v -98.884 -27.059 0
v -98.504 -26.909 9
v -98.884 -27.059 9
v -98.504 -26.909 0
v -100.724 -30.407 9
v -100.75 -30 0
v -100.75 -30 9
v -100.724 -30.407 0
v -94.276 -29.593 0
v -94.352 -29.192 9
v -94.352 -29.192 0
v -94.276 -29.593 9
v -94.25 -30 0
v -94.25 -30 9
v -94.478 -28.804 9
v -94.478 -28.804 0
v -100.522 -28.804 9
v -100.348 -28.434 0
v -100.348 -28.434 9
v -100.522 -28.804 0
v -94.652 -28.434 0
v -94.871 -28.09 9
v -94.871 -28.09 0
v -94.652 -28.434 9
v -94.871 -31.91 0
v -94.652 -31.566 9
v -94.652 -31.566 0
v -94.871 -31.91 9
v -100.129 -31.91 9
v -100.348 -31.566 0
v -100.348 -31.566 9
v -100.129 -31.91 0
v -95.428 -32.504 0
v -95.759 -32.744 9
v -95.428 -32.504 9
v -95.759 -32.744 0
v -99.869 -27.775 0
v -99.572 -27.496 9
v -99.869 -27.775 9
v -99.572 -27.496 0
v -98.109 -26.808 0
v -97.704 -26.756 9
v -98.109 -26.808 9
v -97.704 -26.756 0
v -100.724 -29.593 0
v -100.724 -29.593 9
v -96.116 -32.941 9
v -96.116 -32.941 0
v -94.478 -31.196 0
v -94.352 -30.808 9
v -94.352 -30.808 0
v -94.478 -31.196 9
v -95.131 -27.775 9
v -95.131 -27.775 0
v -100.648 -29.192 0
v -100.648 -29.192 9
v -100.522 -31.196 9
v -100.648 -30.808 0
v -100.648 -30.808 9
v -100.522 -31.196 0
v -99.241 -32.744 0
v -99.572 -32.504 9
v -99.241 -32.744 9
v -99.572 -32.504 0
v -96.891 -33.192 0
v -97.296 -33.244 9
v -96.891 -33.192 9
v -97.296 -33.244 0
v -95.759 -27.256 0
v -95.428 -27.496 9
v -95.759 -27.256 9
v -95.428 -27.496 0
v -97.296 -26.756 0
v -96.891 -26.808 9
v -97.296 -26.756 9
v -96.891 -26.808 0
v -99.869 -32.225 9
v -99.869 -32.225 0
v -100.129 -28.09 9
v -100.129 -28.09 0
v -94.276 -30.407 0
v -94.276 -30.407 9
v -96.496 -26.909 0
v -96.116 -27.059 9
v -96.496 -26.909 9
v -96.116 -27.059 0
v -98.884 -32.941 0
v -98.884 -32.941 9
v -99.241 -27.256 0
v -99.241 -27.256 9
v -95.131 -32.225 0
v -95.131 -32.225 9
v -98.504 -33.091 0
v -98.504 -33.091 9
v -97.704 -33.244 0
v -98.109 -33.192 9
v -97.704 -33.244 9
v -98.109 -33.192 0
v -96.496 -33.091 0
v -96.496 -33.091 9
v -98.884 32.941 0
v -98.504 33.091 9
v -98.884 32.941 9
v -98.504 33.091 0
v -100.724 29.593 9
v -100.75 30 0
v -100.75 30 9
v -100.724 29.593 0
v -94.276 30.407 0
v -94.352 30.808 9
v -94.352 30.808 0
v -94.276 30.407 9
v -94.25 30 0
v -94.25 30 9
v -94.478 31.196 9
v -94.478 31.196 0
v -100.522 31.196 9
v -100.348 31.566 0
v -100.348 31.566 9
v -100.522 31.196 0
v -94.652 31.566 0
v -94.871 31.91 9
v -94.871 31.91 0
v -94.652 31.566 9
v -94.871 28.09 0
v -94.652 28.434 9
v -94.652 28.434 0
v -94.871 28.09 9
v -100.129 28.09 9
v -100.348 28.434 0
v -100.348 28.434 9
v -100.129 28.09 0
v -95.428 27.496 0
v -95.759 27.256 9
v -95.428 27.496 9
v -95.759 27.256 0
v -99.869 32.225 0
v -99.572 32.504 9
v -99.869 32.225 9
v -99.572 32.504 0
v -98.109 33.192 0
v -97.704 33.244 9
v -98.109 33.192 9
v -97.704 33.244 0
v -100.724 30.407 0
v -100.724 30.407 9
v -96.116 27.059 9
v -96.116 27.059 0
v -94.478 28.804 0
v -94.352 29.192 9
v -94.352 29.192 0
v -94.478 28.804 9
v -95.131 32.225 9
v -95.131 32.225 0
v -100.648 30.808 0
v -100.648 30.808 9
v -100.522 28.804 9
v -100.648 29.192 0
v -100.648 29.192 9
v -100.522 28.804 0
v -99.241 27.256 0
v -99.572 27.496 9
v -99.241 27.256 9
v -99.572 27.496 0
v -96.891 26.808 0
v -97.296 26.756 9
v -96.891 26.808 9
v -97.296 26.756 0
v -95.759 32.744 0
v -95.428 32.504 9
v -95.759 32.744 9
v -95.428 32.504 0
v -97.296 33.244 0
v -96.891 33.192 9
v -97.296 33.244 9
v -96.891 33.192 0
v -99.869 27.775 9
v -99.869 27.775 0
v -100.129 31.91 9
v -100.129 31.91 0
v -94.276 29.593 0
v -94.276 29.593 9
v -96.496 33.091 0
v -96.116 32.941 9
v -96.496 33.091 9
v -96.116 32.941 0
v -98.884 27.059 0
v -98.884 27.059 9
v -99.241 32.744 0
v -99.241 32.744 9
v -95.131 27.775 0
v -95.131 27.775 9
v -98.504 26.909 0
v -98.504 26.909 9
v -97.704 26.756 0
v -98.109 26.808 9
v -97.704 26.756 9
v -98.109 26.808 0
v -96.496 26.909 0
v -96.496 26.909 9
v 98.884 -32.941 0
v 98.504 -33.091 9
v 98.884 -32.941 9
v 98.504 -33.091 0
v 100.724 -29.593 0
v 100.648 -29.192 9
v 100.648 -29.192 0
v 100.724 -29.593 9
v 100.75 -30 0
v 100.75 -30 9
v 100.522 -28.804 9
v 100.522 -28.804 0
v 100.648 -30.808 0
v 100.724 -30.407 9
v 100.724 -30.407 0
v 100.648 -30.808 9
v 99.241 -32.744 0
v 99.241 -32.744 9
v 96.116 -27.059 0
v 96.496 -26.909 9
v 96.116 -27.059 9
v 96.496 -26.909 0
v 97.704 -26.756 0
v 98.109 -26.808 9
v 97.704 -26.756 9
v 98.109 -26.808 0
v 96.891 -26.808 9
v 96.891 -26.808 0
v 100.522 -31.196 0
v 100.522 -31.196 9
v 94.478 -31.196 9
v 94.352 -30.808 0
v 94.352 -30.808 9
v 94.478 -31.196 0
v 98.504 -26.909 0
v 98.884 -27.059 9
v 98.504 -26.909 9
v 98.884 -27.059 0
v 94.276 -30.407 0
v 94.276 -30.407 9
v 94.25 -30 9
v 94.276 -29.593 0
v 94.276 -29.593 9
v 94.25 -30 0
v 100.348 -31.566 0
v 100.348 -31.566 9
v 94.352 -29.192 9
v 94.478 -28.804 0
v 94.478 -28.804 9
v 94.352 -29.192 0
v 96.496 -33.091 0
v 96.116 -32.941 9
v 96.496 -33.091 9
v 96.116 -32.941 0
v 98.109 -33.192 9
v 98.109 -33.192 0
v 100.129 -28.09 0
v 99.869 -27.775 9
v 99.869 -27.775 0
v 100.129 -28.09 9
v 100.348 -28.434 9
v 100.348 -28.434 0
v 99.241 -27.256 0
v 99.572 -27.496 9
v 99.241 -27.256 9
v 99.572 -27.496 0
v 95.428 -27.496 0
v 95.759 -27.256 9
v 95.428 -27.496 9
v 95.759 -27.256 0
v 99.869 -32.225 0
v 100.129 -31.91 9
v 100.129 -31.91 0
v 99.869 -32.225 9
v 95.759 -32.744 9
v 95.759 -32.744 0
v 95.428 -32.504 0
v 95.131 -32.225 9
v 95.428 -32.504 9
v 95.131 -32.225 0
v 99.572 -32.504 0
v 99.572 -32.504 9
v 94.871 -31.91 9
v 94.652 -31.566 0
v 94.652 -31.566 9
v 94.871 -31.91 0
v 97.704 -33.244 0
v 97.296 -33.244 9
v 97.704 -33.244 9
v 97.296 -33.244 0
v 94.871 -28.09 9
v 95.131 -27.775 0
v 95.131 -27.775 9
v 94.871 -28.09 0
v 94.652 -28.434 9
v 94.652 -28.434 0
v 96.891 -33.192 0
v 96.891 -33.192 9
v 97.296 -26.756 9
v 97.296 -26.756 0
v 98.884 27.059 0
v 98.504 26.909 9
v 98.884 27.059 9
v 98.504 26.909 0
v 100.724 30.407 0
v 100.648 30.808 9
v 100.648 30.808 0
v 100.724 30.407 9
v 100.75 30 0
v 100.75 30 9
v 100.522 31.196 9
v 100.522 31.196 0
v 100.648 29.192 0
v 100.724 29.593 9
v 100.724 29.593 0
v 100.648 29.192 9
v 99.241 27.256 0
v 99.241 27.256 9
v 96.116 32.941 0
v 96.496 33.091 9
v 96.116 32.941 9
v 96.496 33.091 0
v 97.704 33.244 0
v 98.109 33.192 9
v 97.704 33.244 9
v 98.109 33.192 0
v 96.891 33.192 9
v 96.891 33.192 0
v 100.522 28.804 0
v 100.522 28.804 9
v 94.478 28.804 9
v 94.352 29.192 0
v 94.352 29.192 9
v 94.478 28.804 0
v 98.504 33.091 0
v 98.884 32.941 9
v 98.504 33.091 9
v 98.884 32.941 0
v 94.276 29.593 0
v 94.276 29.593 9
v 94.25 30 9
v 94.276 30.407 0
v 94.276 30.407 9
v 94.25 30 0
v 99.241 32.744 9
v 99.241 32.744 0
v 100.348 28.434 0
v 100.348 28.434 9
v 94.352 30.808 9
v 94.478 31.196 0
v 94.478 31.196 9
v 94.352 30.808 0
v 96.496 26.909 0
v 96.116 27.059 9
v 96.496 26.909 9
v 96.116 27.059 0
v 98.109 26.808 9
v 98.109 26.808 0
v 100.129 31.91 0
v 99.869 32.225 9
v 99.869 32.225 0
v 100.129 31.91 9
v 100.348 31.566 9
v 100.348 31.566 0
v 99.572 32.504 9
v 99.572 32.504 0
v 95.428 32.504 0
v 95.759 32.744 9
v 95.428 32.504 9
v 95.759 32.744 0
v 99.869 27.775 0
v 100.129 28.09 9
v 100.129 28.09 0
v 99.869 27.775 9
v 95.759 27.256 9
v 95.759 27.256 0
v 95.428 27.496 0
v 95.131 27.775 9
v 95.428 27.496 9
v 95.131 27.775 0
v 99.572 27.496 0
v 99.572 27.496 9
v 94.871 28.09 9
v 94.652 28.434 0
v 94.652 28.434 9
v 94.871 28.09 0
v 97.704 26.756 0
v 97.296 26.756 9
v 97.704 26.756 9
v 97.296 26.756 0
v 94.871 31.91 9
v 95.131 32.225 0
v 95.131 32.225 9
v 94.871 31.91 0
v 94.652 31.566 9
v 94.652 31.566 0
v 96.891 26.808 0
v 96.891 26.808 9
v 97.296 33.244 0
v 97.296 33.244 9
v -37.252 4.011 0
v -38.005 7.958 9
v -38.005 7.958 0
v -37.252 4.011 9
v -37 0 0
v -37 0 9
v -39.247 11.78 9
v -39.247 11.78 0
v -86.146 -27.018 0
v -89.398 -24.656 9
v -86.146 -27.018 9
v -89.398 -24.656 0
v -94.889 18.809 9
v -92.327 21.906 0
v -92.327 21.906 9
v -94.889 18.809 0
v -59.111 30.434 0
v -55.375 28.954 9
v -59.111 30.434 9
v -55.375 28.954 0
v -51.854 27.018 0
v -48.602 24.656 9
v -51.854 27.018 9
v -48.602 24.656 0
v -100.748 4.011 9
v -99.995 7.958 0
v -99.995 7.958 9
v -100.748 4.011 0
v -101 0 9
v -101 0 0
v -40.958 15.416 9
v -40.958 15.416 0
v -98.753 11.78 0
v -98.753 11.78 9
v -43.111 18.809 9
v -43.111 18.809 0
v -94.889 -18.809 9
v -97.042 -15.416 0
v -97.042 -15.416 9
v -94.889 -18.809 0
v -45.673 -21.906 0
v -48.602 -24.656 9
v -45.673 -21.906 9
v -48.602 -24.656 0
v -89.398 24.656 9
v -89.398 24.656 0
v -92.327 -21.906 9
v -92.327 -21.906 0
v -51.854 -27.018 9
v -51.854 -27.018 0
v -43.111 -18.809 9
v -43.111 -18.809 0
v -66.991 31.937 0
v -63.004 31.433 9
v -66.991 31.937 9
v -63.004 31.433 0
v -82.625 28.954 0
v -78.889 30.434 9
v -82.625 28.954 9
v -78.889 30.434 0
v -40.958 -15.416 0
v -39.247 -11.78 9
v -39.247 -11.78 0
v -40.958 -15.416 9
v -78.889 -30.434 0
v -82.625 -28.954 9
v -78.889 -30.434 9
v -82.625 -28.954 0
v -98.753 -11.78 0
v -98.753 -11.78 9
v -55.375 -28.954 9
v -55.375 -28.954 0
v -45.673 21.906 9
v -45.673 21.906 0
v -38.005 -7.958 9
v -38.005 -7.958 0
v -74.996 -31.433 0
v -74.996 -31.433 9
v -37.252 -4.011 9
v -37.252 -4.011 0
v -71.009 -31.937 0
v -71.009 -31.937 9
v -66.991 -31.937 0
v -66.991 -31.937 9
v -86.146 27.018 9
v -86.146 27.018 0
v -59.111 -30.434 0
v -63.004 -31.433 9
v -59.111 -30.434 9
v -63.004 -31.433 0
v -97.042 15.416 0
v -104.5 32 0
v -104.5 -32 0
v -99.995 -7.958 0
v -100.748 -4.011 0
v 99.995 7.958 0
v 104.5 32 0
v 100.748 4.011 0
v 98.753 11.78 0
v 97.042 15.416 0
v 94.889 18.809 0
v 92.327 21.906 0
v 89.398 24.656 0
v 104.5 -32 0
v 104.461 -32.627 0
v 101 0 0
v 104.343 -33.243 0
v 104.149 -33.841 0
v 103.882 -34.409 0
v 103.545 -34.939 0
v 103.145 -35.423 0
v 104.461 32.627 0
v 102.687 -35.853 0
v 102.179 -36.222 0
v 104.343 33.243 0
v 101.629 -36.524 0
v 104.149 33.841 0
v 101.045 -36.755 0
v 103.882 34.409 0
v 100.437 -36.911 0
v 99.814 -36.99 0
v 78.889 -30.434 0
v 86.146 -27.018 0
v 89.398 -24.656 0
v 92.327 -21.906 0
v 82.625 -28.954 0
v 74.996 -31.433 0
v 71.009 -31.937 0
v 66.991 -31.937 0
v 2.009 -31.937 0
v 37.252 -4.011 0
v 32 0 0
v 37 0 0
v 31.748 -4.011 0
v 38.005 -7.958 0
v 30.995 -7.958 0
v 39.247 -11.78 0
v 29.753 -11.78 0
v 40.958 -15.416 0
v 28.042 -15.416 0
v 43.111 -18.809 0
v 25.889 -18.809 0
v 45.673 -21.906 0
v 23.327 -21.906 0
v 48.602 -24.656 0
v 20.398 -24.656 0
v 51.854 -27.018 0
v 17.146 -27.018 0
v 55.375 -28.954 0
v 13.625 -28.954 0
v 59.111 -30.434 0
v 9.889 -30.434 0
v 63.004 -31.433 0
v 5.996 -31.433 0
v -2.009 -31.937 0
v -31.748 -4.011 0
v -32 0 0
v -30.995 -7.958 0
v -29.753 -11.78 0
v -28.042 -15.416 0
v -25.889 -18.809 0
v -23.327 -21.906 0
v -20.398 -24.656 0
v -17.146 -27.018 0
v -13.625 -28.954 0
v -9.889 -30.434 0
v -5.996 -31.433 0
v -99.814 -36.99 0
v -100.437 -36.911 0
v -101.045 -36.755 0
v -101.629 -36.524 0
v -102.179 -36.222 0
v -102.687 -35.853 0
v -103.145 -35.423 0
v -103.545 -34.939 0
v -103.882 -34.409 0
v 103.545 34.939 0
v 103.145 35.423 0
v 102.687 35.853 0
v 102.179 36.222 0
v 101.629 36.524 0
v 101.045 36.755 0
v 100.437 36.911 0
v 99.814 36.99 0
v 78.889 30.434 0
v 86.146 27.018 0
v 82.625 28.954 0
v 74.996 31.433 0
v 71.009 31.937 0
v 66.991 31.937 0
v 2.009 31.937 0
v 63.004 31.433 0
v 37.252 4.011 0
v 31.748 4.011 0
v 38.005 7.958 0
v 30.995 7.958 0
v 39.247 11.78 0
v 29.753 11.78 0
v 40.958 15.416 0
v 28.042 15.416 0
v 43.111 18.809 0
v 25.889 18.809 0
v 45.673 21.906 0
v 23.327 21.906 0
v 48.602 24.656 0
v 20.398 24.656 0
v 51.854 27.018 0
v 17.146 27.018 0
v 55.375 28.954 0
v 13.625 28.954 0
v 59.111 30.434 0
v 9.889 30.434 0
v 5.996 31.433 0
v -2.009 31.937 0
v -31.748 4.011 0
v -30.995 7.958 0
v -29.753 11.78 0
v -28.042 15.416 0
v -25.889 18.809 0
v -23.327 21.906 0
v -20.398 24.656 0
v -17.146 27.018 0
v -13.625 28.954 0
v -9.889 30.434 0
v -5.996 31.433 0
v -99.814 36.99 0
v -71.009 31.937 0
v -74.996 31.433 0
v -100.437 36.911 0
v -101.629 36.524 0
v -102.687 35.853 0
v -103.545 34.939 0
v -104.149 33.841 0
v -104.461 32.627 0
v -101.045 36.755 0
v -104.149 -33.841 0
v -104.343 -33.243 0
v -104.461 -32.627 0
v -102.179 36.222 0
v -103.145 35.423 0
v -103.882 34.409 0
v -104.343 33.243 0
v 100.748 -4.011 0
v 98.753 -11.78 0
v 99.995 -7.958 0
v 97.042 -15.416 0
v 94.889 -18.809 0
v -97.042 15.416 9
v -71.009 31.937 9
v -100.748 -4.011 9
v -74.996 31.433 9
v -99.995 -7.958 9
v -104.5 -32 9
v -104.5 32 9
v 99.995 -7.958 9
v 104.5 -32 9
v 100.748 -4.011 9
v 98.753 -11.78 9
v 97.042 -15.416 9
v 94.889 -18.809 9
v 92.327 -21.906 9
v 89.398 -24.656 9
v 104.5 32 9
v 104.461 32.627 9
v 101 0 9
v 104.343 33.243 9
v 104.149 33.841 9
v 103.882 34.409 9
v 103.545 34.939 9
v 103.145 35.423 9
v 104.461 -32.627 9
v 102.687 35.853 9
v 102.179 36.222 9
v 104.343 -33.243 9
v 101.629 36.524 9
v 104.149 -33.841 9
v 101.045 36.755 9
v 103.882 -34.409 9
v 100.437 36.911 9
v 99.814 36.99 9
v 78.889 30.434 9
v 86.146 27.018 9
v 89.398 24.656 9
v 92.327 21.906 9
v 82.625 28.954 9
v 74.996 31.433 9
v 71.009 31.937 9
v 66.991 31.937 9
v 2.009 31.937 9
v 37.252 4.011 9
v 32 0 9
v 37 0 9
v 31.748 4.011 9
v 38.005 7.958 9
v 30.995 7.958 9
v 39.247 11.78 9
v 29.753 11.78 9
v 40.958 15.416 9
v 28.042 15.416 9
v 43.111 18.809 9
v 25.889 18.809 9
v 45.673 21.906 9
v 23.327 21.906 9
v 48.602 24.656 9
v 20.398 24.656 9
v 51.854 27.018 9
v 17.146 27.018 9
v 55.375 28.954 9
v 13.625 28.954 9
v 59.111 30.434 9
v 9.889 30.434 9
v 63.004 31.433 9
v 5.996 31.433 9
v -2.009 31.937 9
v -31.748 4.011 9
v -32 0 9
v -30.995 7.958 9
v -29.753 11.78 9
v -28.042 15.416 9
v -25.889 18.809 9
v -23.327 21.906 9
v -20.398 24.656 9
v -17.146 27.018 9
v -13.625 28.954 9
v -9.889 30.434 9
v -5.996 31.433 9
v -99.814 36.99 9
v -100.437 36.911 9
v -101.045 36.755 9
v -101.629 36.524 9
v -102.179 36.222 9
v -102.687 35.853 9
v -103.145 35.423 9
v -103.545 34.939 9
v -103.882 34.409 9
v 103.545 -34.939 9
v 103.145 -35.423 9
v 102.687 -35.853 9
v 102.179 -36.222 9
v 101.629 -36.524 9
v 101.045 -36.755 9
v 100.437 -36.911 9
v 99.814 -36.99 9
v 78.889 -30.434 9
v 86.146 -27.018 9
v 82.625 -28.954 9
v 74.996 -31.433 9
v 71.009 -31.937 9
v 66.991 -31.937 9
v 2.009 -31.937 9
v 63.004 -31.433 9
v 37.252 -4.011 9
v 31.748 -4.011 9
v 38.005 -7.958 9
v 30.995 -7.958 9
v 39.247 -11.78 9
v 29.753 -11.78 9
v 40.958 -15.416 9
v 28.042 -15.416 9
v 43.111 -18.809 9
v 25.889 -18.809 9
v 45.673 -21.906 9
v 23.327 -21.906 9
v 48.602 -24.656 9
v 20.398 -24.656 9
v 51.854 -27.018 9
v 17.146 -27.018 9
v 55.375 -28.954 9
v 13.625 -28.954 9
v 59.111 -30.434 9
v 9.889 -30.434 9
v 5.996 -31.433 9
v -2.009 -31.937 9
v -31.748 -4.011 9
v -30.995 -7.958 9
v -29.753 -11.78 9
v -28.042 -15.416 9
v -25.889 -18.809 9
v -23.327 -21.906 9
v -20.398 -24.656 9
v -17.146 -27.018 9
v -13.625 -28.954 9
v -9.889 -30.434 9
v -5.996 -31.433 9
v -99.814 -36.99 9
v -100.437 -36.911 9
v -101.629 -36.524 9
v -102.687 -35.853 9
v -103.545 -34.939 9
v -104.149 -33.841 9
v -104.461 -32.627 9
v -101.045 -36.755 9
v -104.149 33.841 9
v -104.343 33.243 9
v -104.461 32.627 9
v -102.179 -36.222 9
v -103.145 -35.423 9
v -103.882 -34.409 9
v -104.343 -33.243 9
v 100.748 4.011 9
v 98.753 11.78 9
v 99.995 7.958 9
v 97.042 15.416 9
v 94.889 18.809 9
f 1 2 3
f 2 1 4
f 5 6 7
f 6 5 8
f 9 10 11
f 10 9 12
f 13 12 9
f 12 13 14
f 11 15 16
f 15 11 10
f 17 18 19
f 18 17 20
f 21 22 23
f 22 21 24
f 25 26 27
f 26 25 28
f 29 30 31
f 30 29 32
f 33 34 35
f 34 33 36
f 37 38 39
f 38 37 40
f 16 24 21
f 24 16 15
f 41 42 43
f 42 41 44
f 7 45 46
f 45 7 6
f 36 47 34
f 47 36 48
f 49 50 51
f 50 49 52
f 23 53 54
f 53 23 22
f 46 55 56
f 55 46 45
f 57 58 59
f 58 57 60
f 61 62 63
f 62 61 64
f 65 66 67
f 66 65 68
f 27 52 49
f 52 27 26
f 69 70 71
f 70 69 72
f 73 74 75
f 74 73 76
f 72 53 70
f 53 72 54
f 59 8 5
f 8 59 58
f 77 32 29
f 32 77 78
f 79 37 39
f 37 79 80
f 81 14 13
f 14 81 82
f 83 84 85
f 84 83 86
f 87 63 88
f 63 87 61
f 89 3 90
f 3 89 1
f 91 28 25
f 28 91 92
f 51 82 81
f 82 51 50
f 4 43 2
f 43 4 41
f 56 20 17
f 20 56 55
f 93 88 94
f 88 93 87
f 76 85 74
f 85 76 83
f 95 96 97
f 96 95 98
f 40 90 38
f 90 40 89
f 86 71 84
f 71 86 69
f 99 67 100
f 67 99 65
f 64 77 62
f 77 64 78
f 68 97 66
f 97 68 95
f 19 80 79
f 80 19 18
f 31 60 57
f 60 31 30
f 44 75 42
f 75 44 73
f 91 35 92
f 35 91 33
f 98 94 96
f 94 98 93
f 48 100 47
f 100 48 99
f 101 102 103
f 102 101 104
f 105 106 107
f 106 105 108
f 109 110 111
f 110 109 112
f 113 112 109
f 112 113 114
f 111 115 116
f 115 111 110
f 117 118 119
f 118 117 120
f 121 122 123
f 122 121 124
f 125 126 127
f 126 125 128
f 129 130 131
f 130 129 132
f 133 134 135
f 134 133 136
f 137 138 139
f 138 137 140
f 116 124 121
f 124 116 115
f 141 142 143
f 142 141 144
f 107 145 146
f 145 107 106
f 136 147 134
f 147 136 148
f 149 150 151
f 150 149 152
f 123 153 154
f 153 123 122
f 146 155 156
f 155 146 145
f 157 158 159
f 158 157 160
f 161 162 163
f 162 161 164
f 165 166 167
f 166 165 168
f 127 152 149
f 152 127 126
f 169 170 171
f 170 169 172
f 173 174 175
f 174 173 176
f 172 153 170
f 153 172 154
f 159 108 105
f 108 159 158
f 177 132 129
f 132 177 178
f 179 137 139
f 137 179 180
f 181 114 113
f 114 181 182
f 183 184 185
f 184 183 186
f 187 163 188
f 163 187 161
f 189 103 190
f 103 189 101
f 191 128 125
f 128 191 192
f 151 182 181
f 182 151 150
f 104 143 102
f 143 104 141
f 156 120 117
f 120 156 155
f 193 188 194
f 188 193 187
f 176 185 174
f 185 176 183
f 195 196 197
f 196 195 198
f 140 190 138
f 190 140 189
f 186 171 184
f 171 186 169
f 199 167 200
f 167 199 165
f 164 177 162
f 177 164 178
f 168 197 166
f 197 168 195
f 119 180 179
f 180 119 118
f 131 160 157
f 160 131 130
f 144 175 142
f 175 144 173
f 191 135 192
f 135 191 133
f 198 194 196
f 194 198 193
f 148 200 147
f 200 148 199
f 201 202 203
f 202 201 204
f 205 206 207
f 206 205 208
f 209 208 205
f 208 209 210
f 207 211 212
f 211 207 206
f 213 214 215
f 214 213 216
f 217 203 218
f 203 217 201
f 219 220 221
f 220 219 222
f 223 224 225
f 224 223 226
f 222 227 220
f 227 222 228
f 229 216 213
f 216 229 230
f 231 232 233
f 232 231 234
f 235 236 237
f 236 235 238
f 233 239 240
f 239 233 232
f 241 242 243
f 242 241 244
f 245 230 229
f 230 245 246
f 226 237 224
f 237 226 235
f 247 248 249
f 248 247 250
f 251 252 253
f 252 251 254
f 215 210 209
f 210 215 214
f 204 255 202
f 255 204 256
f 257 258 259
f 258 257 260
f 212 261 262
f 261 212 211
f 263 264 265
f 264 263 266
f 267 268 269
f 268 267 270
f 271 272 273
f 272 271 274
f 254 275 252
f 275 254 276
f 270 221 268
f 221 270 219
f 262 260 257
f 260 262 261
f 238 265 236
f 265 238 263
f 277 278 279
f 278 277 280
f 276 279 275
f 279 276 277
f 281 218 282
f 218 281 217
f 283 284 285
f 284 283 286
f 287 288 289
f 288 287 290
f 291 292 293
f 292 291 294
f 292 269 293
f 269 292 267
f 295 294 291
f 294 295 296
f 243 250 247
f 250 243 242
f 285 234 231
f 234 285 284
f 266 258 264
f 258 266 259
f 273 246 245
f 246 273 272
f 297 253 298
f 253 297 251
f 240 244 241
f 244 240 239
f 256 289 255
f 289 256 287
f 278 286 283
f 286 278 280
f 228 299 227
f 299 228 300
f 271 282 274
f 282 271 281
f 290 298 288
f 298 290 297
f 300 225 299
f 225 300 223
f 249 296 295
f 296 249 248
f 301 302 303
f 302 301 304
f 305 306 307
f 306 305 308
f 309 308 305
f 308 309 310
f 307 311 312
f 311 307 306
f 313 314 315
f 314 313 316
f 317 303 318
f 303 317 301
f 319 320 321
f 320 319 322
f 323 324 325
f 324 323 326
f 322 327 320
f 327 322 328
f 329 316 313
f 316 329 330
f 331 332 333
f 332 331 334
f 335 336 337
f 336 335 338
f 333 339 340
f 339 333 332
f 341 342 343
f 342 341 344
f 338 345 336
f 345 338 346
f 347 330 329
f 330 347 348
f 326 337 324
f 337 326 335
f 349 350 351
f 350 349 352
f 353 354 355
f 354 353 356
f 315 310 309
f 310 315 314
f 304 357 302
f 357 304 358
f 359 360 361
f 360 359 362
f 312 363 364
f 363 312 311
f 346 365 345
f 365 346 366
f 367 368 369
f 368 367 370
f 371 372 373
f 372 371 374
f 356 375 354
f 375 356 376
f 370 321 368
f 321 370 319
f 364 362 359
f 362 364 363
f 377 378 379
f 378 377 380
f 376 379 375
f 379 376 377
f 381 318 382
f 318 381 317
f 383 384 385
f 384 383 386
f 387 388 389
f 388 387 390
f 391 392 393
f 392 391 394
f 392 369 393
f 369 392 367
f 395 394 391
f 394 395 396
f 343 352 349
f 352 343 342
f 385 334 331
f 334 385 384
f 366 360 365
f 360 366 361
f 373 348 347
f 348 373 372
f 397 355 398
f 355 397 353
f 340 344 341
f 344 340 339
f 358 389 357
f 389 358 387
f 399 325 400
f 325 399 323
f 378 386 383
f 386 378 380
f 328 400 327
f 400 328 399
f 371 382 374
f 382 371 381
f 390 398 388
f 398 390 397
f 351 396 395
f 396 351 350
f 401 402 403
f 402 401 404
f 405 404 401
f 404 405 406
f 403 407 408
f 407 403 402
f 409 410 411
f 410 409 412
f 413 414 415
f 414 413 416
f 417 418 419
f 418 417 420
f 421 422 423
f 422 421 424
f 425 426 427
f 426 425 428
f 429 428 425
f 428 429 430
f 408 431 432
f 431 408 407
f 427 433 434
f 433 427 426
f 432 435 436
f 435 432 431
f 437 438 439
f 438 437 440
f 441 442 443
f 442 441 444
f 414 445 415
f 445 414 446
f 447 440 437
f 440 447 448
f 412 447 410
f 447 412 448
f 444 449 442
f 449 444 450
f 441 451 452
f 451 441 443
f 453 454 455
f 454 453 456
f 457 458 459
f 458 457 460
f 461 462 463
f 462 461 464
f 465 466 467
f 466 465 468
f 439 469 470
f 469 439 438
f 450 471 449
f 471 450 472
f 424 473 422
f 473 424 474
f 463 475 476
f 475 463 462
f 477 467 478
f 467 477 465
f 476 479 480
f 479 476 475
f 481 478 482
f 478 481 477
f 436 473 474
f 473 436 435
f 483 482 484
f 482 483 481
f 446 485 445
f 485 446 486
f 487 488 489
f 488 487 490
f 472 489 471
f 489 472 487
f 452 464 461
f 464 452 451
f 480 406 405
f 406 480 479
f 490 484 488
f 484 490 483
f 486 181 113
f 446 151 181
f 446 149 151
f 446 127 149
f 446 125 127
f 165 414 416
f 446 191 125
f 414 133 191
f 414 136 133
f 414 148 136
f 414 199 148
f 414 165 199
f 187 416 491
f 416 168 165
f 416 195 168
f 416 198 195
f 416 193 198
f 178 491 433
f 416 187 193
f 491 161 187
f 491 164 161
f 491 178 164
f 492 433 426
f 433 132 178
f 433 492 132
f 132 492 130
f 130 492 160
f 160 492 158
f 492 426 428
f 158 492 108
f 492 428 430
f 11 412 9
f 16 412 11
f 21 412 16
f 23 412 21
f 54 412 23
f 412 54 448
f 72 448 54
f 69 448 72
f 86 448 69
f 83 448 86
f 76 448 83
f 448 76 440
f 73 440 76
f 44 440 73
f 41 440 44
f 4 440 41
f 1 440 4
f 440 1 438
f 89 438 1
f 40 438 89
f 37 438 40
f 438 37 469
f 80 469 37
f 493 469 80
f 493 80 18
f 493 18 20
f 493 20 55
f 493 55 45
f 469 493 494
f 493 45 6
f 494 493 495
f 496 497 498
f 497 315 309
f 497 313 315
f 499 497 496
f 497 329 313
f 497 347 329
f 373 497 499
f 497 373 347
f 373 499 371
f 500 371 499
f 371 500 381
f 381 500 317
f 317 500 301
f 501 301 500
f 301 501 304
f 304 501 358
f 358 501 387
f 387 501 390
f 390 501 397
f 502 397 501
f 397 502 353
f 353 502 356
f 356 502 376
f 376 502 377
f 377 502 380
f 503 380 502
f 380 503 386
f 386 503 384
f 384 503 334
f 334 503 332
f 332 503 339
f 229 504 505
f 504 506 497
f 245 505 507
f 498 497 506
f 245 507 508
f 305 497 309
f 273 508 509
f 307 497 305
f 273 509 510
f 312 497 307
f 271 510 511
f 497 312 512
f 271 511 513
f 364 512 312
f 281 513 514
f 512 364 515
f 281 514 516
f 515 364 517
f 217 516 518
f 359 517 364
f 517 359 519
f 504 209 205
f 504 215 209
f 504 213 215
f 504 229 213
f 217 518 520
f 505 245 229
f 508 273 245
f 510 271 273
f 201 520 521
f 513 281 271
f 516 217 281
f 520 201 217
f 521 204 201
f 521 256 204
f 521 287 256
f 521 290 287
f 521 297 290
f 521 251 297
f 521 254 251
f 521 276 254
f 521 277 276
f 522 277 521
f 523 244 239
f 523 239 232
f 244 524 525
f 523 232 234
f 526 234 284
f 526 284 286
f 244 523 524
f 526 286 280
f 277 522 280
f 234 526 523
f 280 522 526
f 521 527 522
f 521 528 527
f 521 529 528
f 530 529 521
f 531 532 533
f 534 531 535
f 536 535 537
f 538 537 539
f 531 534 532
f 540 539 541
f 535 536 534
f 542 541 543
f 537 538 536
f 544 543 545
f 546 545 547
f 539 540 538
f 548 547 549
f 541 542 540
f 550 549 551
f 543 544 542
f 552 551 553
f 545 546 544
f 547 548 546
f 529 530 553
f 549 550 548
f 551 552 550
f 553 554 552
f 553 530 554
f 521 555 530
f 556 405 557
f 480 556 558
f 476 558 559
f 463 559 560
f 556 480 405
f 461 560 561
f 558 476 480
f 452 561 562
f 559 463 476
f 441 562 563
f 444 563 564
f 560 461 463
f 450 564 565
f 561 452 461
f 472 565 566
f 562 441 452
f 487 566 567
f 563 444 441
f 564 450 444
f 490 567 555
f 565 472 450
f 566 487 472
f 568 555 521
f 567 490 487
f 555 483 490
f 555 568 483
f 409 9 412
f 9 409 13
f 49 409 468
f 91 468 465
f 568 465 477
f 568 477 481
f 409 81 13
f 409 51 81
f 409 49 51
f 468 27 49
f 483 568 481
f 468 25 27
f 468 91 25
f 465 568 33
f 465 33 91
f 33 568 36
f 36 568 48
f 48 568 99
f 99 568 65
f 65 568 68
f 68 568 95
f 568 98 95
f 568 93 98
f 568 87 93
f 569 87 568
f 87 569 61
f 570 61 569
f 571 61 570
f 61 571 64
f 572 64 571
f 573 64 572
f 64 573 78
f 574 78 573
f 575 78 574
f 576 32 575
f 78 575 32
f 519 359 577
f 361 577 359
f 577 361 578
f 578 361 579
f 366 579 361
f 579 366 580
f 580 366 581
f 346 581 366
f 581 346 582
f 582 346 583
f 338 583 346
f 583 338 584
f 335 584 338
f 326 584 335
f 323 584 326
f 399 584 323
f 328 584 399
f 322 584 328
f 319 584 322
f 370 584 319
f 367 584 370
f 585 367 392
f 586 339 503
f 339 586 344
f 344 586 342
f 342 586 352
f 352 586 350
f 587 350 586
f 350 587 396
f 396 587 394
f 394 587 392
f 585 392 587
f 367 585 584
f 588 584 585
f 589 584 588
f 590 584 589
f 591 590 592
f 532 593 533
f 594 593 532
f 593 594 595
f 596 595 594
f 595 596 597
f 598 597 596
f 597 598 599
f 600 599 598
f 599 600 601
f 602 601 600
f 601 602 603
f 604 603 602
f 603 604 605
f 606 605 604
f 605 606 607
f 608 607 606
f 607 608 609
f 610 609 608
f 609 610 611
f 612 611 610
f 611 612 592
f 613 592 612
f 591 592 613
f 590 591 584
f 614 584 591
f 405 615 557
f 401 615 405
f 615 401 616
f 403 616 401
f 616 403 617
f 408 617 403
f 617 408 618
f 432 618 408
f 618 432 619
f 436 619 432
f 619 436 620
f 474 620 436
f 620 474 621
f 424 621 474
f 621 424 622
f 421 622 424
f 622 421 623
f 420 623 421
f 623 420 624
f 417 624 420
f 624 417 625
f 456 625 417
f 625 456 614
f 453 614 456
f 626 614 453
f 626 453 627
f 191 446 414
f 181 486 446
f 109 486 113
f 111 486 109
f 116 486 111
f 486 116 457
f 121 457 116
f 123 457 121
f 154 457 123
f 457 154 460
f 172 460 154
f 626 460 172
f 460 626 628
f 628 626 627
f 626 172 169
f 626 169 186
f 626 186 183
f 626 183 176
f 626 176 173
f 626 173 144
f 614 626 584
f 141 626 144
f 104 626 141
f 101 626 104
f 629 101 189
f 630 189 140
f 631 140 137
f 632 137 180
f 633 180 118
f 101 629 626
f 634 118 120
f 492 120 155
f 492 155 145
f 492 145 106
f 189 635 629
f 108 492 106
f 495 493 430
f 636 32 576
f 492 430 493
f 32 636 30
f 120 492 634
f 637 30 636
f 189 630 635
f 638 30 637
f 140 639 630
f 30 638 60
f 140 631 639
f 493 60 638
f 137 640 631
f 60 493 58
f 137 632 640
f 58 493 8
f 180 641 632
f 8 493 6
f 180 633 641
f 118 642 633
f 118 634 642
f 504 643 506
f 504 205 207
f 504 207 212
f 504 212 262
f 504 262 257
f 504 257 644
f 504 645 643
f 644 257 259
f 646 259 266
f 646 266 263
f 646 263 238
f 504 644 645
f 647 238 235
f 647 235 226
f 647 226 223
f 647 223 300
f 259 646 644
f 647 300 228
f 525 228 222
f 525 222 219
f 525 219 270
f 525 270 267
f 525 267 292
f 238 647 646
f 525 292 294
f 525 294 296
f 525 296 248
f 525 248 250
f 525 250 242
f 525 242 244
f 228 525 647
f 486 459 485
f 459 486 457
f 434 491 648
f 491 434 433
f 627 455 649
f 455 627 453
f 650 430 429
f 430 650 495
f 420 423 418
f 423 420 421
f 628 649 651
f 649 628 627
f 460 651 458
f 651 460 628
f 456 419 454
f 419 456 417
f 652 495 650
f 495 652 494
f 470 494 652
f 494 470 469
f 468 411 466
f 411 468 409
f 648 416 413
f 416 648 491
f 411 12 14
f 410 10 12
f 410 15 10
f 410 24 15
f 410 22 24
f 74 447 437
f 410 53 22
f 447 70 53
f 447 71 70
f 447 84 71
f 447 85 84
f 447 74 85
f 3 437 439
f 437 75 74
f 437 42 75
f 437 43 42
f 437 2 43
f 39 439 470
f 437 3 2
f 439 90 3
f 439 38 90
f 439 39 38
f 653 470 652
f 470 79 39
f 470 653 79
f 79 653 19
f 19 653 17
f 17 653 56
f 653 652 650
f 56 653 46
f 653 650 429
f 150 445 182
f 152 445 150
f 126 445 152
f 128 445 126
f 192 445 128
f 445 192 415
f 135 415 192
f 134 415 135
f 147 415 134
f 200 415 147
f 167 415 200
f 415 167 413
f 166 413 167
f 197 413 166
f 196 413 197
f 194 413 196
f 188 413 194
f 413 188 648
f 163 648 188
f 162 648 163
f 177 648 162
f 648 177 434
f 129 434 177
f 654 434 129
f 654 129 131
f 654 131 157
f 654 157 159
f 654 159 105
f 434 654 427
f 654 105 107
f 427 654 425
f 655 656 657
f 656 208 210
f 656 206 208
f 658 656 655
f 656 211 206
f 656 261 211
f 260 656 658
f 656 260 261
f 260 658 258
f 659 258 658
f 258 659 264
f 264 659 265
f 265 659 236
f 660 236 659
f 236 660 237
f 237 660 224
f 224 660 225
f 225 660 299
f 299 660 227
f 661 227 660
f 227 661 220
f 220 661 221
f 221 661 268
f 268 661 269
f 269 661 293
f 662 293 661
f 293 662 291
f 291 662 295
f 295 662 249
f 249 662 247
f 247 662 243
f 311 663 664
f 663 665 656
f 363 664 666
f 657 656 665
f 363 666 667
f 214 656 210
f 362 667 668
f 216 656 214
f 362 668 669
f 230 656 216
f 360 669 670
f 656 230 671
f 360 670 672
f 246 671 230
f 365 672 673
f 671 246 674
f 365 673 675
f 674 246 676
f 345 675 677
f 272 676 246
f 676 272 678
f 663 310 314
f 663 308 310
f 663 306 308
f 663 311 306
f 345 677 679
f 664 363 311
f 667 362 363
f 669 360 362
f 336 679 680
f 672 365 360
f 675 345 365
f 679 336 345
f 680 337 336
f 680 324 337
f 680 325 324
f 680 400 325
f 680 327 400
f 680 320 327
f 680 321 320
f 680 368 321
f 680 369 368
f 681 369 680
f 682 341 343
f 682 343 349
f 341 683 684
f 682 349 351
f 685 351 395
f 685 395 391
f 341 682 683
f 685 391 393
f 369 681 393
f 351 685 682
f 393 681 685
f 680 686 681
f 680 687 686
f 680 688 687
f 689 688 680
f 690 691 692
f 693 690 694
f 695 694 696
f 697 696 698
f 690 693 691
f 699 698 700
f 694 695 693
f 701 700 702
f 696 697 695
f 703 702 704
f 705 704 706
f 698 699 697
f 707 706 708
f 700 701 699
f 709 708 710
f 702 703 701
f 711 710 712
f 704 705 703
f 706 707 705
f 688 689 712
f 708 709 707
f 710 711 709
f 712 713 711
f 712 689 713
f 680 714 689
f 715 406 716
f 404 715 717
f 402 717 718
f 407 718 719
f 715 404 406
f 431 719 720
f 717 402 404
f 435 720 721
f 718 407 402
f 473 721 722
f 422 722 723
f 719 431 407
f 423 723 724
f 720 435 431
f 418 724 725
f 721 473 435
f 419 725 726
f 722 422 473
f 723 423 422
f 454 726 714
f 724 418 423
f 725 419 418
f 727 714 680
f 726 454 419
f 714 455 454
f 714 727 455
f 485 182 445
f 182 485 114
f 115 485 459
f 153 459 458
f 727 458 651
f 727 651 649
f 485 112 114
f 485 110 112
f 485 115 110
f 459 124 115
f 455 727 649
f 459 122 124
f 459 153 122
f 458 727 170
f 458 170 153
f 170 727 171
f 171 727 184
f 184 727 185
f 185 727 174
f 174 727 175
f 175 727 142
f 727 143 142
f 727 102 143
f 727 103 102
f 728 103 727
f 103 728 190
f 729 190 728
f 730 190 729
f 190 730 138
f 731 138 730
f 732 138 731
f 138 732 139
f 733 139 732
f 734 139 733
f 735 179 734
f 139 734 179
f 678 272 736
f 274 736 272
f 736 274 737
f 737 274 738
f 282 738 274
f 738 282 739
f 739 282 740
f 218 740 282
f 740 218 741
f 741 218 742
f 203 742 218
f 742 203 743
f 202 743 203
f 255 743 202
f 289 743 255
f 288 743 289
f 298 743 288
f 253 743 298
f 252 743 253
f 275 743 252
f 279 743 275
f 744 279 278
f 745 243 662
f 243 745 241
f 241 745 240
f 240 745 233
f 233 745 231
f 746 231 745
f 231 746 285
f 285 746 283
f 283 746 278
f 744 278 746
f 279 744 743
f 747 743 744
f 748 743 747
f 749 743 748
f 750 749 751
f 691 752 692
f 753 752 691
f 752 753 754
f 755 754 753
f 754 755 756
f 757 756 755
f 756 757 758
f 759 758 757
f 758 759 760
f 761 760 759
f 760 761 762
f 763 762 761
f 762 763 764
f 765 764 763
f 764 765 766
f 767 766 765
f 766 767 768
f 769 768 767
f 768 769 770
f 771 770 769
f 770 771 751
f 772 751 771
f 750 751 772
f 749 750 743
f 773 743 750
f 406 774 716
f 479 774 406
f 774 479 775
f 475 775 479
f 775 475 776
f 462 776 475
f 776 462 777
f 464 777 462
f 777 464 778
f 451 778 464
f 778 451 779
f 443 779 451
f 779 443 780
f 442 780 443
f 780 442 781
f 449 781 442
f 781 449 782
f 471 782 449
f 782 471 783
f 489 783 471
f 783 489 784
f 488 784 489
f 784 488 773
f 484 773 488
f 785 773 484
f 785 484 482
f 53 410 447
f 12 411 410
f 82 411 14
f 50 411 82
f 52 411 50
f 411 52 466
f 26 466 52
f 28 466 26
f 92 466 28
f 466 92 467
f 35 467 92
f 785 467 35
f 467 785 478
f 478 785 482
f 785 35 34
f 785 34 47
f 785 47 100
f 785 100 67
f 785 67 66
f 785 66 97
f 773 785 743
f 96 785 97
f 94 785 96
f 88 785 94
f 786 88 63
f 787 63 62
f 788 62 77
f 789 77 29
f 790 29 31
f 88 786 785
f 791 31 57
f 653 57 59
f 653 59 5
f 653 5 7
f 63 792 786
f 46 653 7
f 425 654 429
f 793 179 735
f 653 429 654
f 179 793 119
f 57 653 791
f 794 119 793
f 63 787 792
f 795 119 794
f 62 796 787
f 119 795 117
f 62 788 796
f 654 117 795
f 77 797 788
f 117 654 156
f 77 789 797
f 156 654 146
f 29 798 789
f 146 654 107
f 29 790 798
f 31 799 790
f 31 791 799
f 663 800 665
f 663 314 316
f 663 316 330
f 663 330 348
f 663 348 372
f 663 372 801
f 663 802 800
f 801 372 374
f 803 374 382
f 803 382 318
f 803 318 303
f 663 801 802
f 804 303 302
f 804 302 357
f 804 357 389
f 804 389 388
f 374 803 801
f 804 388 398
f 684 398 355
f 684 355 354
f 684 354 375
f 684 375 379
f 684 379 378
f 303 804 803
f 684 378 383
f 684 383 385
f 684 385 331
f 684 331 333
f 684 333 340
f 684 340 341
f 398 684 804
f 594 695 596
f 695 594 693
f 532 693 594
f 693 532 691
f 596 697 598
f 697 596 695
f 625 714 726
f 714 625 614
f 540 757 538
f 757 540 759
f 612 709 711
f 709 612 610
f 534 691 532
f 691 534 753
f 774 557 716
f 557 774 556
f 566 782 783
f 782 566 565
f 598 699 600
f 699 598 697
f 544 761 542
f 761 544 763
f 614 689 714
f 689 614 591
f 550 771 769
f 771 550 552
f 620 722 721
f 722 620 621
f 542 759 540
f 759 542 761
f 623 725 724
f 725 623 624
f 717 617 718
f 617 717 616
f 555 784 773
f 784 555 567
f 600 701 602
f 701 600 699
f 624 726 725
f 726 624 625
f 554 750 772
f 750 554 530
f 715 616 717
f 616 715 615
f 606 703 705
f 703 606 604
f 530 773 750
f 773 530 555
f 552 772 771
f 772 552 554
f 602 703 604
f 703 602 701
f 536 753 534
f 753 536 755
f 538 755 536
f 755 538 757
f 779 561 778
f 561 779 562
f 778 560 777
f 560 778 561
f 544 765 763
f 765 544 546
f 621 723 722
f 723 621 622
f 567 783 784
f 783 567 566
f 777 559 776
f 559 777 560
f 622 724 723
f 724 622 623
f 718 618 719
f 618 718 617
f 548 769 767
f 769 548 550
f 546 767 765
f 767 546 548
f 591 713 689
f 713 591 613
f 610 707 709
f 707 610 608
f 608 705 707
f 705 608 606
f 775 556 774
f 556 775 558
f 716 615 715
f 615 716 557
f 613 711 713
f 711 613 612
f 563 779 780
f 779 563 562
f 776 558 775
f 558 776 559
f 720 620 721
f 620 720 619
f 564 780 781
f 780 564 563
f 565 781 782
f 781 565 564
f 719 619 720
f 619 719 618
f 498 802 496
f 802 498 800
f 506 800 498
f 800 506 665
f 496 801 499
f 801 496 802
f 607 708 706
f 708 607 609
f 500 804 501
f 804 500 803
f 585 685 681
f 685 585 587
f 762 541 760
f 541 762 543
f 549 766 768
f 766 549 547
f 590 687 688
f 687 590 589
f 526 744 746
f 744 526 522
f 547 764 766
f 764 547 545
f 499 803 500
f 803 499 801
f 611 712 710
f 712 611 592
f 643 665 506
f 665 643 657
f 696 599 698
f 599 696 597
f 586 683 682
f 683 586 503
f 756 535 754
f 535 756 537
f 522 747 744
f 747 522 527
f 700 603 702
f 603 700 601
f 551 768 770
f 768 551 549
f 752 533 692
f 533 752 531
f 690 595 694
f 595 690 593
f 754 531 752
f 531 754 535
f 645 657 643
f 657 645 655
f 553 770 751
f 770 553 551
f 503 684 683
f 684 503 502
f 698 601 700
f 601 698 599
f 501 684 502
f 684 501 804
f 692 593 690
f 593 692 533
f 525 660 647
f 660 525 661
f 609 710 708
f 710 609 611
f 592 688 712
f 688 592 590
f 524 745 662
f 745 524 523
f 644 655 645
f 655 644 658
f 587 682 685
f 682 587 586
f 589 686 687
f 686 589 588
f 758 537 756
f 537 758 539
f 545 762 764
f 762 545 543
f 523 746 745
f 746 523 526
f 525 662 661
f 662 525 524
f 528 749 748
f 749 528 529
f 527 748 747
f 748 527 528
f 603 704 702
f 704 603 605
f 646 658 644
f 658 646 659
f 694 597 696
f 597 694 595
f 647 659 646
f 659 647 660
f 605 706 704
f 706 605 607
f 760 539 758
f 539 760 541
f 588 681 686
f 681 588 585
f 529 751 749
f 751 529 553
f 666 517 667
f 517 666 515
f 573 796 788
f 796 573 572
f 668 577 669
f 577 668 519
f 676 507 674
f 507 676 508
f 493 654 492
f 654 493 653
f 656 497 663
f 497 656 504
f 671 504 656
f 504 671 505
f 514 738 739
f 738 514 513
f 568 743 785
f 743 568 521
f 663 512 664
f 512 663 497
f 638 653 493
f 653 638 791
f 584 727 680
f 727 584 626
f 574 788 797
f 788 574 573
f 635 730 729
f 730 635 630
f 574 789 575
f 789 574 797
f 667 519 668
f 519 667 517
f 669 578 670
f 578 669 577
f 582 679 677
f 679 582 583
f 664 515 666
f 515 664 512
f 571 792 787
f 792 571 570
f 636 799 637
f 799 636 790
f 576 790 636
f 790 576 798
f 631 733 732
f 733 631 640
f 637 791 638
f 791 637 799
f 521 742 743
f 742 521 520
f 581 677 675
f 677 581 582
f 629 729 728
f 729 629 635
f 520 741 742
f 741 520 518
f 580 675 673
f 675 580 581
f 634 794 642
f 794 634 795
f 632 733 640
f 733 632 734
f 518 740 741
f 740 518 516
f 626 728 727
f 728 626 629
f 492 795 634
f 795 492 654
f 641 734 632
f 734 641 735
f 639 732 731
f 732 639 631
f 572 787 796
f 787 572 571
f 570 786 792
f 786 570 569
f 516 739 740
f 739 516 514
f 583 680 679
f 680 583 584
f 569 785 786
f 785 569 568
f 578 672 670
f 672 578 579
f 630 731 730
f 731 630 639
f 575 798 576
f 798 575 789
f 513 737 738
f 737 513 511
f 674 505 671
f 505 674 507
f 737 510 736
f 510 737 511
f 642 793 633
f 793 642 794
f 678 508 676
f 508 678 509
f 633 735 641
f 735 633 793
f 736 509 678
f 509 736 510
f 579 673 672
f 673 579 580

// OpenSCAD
$fn = 50;

difference() {
	union() {
		hull() {
			translate(v = [-99.5, 32.0, 0]) {
				cylinder(h = 9, r = 5);
			}
			translate(v = [99.5, 32.0, 0]) {
				cylinder(h = 9, r = 5);
			}
			translate(v = [-99.5, -32.0, 0]) {
				cylinder(h = 9, r = 5);
			}
			translate(v = [99.5, -32.0, 0]) {
				cylinder(h = 9, r = 5);
			}
		}
	}
	union() {
		translate(v = [-97.5, -30.0, -100.0]) {
			cylinder(h = 200, r = 3.25);
		}
		translate(v = [-97.5, 30.0, -100.0]) {
			cylinder(h = 200, r = 3.25);
		}
		translate(v = [97.5, -30.0, -100.0]) {
			cylinder(h = 200, r = 3.25);
		}
		translate(v = [97.5, 30.0, -100.0]) {
			cylinder(h = 200, r = 3.25);
		}
		translate(v = [-97.5, -30.0, -100.0]) {
			cylinder(h = 200, r = 1.8);
		}
		translate(v = [-97.5, 30.0, -100.0]) {
			cylinder(h = 200, r = 1.8);
		}
		translate(v = [97.5, -30.0, -100.0]) {
			cylinder(h = 200, r = 1.8);
		}
		translate(v = [97.5, 30.0, -100.0]) {
			cylinder(h = 200, r = 1.8);
		}
		translate(v = [-69.0, 0, 0.0]) {
			cylinder(h = 9, r = 32.0);
		}
		cylinder(h = 9, r = 32.0);
		translate(v = [69.0, 0, 0.0]) {
			cylinder(h = 9, r = 32.0);
		}
	}
}
